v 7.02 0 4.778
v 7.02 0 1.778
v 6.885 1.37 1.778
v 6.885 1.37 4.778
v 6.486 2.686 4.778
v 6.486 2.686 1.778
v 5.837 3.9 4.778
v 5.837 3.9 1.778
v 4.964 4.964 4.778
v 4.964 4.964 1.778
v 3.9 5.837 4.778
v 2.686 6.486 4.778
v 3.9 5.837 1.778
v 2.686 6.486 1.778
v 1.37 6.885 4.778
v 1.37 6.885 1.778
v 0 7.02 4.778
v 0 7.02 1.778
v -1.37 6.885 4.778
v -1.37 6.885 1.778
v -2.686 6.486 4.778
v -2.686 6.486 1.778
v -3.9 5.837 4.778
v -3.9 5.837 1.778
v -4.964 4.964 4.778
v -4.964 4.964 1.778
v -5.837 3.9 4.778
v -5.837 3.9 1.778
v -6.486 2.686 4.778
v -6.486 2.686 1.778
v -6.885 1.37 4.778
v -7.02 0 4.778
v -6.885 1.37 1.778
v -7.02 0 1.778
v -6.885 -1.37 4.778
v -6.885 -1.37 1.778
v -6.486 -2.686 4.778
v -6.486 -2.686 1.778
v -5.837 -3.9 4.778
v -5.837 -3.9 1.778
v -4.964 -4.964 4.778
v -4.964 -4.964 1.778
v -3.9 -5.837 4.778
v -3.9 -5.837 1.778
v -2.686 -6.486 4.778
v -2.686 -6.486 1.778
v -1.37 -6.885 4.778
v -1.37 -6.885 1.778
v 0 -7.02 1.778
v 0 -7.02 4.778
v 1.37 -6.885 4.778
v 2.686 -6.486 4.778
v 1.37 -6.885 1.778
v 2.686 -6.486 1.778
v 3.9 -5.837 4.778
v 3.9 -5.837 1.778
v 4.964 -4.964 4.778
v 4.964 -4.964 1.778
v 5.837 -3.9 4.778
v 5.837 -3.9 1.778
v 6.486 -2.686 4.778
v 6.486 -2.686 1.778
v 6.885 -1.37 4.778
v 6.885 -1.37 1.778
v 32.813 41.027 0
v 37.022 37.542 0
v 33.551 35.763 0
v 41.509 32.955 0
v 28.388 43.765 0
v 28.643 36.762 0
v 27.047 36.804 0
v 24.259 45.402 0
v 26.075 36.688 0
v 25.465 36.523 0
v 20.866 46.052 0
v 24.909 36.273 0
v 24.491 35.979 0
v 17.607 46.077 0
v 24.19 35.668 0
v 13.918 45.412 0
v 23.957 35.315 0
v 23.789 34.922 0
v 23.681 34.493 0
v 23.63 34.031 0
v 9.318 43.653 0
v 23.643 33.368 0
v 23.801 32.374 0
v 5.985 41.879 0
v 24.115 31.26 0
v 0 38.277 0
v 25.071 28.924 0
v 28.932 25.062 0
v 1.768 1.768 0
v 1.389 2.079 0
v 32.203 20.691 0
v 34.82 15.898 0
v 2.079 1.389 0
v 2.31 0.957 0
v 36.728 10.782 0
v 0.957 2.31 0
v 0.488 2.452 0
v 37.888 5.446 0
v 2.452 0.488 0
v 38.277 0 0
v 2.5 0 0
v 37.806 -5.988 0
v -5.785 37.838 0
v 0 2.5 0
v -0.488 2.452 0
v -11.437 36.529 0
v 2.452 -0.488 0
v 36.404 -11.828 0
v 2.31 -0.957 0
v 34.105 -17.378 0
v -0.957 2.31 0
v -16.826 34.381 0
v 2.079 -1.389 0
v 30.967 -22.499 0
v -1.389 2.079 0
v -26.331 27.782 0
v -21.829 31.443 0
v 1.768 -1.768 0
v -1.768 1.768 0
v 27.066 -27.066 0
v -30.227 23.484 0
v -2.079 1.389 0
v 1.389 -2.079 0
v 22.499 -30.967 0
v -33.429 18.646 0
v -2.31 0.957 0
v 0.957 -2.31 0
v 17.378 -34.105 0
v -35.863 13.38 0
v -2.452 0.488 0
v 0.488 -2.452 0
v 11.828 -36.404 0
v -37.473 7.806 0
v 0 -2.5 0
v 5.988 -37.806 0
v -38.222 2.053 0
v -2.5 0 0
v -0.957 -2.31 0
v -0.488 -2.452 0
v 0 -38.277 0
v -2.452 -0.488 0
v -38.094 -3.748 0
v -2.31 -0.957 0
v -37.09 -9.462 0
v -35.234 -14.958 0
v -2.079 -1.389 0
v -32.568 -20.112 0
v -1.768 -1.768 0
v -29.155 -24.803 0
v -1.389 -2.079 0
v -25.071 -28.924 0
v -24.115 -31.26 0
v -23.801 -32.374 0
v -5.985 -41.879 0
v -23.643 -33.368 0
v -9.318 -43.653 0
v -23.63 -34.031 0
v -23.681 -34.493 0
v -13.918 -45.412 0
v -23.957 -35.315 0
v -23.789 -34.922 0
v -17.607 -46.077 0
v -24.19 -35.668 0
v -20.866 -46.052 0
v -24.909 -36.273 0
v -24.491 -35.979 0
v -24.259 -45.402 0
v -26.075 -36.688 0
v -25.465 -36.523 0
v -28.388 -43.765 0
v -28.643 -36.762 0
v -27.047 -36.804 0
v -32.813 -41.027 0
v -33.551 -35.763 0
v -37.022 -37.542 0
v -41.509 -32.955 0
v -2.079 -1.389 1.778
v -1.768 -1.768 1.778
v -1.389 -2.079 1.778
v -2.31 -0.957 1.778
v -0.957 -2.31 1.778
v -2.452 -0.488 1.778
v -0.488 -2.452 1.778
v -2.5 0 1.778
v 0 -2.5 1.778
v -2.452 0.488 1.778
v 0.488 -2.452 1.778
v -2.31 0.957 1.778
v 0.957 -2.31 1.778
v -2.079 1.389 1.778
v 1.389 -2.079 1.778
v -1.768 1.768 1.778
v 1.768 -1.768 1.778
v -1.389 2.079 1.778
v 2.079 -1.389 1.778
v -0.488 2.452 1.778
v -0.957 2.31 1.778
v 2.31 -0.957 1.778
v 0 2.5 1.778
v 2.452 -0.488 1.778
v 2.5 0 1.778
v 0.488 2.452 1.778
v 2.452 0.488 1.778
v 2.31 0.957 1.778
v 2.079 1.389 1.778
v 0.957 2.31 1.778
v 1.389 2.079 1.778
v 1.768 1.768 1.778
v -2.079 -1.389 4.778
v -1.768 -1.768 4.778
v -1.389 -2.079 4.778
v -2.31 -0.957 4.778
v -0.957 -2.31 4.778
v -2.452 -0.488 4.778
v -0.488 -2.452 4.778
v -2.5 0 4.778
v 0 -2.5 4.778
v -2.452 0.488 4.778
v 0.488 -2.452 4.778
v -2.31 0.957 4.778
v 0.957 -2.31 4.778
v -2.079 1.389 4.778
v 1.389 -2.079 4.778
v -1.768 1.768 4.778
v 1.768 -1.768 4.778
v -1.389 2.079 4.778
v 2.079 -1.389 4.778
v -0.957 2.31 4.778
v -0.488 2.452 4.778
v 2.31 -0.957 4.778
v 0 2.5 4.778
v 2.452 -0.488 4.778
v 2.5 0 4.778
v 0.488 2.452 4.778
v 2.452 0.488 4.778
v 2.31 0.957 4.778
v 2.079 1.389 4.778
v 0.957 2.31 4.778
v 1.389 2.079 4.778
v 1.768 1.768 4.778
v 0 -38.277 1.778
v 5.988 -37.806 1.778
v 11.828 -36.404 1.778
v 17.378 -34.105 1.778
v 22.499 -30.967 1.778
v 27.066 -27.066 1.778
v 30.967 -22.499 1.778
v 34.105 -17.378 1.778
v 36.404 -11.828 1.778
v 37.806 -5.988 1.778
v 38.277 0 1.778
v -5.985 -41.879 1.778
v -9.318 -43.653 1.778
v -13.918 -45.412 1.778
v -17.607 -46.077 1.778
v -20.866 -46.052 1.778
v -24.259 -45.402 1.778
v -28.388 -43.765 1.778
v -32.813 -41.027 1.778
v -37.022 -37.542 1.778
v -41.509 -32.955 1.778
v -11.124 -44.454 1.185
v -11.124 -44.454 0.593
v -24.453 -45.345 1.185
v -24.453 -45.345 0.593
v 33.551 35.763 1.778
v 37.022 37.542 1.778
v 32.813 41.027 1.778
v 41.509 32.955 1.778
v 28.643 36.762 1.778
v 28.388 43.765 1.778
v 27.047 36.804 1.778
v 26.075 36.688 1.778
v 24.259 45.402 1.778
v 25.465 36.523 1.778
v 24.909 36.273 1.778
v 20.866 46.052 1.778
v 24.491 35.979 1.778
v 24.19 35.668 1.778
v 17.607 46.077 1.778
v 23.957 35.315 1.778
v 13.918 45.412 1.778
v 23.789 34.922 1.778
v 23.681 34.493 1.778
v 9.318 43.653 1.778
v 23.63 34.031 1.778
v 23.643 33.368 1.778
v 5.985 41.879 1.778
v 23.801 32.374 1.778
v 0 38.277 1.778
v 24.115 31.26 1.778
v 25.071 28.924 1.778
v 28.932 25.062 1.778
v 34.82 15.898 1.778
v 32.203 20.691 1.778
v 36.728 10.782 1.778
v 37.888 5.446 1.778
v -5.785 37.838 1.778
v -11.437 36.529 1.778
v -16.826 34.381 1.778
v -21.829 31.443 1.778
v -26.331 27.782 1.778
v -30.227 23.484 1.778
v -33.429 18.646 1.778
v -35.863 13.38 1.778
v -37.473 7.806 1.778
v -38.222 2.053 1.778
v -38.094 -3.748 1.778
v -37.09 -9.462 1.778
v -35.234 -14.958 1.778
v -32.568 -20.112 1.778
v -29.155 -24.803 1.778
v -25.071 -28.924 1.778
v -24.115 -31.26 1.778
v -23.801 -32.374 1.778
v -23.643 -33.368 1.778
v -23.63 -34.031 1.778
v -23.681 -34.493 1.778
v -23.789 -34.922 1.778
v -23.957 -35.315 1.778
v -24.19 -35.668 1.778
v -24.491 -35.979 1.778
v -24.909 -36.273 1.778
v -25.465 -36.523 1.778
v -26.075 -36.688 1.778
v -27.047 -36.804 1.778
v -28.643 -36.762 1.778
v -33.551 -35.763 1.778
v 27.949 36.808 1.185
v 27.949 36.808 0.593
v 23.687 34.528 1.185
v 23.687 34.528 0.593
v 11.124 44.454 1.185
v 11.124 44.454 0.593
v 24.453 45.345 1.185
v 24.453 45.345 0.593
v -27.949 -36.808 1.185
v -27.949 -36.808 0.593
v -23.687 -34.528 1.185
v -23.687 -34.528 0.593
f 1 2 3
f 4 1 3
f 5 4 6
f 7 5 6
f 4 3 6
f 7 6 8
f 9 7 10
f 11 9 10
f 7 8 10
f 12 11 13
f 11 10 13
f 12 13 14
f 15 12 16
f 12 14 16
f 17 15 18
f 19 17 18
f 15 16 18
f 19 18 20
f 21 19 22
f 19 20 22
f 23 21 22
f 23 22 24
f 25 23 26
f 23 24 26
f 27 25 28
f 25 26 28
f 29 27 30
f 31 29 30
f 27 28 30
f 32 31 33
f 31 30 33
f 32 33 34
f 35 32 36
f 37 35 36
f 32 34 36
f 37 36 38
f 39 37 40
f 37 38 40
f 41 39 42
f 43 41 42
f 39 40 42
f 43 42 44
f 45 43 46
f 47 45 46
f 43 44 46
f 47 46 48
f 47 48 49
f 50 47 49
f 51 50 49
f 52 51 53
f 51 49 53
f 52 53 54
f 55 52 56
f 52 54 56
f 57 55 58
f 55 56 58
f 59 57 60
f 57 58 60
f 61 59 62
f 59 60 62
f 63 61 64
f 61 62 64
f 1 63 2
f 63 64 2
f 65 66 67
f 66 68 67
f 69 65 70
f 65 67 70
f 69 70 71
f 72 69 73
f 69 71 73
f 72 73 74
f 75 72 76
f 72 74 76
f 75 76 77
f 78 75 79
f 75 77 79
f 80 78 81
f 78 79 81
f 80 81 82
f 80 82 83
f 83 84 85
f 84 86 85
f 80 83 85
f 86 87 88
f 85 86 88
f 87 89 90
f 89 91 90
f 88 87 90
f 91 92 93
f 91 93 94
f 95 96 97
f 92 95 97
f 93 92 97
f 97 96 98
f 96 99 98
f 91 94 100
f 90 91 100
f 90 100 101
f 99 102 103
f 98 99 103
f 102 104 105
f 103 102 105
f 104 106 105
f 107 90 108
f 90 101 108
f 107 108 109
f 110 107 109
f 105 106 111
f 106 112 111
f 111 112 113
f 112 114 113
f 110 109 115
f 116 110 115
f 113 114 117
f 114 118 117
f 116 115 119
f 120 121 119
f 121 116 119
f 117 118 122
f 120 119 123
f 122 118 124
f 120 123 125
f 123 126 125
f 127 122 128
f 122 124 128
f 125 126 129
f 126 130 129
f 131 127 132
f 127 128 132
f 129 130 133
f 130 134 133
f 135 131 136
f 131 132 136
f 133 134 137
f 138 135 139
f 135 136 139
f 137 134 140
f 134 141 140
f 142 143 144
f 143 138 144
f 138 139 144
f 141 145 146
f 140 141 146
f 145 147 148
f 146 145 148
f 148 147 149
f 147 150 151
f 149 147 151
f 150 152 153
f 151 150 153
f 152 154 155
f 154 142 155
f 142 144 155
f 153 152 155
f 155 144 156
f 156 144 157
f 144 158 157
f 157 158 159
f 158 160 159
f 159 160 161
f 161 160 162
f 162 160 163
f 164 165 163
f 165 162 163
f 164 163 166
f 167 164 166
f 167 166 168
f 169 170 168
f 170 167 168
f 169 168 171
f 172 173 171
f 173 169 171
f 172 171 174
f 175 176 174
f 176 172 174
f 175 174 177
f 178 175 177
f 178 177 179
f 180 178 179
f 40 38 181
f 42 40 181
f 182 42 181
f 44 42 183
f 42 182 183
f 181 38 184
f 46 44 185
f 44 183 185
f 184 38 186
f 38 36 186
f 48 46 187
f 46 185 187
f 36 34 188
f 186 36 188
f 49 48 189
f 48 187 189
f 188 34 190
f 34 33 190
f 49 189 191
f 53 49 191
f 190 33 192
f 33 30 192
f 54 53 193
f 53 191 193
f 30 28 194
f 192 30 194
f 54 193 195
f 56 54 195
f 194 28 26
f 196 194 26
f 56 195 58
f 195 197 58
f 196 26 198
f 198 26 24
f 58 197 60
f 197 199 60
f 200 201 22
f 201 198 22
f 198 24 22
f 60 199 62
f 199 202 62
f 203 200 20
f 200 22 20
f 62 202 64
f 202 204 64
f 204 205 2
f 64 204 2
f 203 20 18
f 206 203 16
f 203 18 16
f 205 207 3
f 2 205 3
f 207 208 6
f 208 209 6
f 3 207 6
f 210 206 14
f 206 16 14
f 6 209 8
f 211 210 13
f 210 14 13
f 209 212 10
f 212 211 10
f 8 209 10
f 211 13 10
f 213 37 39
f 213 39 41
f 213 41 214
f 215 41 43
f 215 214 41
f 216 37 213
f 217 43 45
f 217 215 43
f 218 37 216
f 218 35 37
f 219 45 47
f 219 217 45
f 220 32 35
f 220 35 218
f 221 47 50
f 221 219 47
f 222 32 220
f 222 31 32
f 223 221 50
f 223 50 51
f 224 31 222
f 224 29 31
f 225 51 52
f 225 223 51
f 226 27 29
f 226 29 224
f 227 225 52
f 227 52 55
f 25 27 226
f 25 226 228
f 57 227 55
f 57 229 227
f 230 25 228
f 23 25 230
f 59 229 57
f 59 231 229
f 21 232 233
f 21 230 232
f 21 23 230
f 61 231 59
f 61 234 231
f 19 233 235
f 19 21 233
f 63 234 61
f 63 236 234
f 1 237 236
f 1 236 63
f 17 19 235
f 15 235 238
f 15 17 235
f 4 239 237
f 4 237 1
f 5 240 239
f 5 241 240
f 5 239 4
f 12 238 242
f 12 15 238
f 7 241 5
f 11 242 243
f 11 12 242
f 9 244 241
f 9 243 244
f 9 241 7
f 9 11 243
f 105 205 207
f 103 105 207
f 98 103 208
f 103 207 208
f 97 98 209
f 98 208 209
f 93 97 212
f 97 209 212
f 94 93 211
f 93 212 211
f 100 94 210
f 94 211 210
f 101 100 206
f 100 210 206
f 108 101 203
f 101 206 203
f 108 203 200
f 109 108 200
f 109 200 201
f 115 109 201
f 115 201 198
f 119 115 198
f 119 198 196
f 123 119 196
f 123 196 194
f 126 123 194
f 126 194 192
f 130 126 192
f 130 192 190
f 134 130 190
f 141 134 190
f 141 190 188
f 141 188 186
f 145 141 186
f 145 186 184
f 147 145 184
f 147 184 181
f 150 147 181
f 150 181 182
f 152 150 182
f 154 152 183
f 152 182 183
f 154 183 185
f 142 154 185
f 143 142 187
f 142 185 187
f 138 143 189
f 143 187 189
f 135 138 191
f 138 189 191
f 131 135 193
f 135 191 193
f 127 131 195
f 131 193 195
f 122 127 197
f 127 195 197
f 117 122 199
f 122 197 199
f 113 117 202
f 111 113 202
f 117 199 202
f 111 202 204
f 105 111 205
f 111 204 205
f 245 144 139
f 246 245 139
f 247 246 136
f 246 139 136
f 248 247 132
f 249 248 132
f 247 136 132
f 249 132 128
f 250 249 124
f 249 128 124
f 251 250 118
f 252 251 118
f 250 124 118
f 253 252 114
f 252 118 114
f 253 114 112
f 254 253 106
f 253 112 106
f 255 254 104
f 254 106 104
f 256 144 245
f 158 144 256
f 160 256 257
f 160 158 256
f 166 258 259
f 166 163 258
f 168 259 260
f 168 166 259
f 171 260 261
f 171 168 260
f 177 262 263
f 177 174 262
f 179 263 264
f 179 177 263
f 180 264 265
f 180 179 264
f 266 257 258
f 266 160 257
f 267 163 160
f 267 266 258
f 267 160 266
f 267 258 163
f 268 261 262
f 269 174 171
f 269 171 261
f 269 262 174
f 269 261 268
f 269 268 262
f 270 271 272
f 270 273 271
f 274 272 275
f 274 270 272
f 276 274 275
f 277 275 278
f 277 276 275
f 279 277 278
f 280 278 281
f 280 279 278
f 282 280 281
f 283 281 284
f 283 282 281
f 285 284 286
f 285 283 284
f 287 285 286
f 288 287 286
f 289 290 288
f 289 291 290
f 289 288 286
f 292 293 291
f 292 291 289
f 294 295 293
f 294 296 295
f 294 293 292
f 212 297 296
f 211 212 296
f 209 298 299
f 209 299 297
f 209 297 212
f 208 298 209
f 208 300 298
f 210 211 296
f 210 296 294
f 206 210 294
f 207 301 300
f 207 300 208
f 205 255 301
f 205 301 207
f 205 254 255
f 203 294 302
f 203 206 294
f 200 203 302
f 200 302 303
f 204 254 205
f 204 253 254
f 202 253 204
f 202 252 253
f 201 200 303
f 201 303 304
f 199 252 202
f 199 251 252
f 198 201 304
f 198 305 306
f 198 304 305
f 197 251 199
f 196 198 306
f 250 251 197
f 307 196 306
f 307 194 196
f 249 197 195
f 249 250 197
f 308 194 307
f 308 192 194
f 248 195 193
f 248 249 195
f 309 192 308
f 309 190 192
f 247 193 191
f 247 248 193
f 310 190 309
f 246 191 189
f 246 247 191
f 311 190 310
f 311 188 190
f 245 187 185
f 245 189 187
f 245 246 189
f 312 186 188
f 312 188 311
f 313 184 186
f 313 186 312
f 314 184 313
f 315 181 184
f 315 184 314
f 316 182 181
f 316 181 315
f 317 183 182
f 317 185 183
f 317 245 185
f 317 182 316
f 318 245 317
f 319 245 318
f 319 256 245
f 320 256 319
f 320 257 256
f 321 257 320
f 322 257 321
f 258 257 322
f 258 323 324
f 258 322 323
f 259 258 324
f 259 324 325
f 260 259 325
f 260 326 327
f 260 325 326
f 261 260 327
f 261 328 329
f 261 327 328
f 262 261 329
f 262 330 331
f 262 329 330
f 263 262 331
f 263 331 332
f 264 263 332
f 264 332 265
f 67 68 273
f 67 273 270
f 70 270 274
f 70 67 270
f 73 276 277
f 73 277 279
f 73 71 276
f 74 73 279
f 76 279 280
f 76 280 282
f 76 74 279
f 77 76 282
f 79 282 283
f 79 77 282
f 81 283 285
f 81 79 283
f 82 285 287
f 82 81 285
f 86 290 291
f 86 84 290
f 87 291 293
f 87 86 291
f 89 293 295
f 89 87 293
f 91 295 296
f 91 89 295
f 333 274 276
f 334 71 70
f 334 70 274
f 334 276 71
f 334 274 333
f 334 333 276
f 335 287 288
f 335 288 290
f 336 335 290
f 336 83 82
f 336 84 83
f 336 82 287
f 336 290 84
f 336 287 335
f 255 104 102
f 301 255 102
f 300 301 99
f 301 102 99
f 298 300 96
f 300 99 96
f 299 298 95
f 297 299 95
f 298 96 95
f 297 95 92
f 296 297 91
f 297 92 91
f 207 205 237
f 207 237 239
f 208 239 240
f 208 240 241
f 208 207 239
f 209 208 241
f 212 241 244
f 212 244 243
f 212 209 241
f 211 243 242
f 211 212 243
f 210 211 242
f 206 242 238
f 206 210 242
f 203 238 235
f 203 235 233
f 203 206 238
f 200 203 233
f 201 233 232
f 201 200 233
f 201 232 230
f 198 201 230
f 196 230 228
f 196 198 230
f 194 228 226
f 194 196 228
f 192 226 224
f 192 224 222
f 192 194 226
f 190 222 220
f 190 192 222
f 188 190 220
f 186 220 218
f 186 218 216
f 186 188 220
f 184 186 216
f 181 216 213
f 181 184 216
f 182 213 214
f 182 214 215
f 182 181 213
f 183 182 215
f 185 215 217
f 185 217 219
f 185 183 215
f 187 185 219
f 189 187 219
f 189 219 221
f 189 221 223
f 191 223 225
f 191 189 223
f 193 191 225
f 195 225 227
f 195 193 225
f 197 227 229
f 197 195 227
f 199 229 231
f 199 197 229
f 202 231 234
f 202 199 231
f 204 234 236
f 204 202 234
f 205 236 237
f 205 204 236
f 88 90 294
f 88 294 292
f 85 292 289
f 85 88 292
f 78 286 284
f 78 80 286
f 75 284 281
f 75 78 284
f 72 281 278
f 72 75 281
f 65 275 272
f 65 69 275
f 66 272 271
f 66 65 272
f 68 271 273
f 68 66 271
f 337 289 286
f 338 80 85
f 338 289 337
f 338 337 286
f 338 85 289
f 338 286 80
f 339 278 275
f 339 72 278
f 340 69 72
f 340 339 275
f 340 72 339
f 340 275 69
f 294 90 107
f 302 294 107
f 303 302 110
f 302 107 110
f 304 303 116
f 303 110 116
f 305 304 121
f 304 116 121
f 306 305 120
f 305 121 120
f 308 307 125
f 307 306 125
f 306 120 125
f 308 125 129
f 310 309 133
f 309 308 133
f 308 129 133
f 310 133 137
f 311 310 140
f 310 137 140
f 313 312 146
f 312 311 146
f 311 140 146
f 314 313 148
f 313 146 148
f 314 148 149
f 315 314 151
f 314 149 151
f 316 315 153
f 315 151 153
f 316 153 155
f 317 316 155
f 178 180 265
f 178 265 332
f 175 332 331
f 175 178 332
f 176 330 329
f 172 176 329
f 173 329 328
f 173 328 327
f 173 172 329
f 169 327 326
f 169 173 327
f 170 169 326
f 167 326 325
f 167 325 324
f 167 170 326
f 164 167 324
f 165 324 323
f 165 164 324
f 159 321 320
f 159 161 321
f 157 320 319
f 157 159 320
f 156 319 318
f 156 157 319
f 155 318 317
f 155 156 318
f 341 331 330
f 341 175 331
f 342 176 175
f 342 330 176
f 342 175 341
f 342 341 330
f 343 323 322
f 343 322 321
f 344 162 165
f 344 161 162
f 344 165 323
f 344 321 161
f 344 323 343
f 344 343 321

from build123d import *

# Parameters (mm, degrees)
F1_DEPTH = 1.778
F2_COUNT = 2
F3_R     = 2.5
F4_DEPTH = 25
F5_R     = 7.02
F5_R_2   = 2.5
F6_DEPTH = 3


with BuildPart() as f1:
    # F0 (on Top) → F1 (new body)
    with BuildSketch(Plane.XY):
        with BuildLine():
            ThreePointArc((0, 38.277449), (13.379533, 35.86295), (25.071134, 28.924061))
            add(Edge.make_bspline(
                [(41.508727, 32.954903), (22.082335, 40.809391), (22.082335, 35.254759), (25.071134, 28.924061)],
                knots=[0, 0, 0, 0, 16.924601, 16.924601, 16.924601, 16.924601], degree=3))
            add(Edge.make_bspline(
                [(0, 38.277449), (10.527689, 44.431913), (22.082335, 54.651333), (41.508727, 32.954903)],
                knots=[0, 0, 0, 0, 41.848583, 41.848583, 41.848583, 41.848583], degree=3))
        make_face()
        with BuildLine():
            ThreePointArc((0, 38.277449), (-27.066244, -27.066244), (38.277449, 0))
            ThreePointArc((38.277449, 0), (34.819694, 15.898176), (25.071134, 28.924061))
            ThreePointArc((25.071134, 28.924061), (13.379533, 35.86295), (0, 38.277449))
        make_face()
    extrude(amount=F1_DEPTH)

    # F2: F1 ×2 about axis
    f2_axis = Axis((0, 0, 0), (0, 0, -1))


with BuildPart() as f1_1:
    add(f1.part)
    for i in range(1, F2_COUNT):
        add(f1.part.rotate(f2_axis, i * 360 / F2_COUNT))

    # F3 (on face) → F4 (cut)
    with BuildSketch(Plane.XY.offset(1.778)):
        Circle(F3_R)
    extrude(amount=-F4_DEPTH, mode=Mode.SUBTRACT)


with BuildPart() as f6:
    # F5 (on face) → F6 (new body)
    with BuildSketch(Plane.XY.offset(1.778)):
        Circle(F5_R)
        Circle(F5_R_2, mode=Mode.SUBTRACT)
    extrude(amount=F6_DEPTH)


solid = Compound([f1_1.part, f6.part])
